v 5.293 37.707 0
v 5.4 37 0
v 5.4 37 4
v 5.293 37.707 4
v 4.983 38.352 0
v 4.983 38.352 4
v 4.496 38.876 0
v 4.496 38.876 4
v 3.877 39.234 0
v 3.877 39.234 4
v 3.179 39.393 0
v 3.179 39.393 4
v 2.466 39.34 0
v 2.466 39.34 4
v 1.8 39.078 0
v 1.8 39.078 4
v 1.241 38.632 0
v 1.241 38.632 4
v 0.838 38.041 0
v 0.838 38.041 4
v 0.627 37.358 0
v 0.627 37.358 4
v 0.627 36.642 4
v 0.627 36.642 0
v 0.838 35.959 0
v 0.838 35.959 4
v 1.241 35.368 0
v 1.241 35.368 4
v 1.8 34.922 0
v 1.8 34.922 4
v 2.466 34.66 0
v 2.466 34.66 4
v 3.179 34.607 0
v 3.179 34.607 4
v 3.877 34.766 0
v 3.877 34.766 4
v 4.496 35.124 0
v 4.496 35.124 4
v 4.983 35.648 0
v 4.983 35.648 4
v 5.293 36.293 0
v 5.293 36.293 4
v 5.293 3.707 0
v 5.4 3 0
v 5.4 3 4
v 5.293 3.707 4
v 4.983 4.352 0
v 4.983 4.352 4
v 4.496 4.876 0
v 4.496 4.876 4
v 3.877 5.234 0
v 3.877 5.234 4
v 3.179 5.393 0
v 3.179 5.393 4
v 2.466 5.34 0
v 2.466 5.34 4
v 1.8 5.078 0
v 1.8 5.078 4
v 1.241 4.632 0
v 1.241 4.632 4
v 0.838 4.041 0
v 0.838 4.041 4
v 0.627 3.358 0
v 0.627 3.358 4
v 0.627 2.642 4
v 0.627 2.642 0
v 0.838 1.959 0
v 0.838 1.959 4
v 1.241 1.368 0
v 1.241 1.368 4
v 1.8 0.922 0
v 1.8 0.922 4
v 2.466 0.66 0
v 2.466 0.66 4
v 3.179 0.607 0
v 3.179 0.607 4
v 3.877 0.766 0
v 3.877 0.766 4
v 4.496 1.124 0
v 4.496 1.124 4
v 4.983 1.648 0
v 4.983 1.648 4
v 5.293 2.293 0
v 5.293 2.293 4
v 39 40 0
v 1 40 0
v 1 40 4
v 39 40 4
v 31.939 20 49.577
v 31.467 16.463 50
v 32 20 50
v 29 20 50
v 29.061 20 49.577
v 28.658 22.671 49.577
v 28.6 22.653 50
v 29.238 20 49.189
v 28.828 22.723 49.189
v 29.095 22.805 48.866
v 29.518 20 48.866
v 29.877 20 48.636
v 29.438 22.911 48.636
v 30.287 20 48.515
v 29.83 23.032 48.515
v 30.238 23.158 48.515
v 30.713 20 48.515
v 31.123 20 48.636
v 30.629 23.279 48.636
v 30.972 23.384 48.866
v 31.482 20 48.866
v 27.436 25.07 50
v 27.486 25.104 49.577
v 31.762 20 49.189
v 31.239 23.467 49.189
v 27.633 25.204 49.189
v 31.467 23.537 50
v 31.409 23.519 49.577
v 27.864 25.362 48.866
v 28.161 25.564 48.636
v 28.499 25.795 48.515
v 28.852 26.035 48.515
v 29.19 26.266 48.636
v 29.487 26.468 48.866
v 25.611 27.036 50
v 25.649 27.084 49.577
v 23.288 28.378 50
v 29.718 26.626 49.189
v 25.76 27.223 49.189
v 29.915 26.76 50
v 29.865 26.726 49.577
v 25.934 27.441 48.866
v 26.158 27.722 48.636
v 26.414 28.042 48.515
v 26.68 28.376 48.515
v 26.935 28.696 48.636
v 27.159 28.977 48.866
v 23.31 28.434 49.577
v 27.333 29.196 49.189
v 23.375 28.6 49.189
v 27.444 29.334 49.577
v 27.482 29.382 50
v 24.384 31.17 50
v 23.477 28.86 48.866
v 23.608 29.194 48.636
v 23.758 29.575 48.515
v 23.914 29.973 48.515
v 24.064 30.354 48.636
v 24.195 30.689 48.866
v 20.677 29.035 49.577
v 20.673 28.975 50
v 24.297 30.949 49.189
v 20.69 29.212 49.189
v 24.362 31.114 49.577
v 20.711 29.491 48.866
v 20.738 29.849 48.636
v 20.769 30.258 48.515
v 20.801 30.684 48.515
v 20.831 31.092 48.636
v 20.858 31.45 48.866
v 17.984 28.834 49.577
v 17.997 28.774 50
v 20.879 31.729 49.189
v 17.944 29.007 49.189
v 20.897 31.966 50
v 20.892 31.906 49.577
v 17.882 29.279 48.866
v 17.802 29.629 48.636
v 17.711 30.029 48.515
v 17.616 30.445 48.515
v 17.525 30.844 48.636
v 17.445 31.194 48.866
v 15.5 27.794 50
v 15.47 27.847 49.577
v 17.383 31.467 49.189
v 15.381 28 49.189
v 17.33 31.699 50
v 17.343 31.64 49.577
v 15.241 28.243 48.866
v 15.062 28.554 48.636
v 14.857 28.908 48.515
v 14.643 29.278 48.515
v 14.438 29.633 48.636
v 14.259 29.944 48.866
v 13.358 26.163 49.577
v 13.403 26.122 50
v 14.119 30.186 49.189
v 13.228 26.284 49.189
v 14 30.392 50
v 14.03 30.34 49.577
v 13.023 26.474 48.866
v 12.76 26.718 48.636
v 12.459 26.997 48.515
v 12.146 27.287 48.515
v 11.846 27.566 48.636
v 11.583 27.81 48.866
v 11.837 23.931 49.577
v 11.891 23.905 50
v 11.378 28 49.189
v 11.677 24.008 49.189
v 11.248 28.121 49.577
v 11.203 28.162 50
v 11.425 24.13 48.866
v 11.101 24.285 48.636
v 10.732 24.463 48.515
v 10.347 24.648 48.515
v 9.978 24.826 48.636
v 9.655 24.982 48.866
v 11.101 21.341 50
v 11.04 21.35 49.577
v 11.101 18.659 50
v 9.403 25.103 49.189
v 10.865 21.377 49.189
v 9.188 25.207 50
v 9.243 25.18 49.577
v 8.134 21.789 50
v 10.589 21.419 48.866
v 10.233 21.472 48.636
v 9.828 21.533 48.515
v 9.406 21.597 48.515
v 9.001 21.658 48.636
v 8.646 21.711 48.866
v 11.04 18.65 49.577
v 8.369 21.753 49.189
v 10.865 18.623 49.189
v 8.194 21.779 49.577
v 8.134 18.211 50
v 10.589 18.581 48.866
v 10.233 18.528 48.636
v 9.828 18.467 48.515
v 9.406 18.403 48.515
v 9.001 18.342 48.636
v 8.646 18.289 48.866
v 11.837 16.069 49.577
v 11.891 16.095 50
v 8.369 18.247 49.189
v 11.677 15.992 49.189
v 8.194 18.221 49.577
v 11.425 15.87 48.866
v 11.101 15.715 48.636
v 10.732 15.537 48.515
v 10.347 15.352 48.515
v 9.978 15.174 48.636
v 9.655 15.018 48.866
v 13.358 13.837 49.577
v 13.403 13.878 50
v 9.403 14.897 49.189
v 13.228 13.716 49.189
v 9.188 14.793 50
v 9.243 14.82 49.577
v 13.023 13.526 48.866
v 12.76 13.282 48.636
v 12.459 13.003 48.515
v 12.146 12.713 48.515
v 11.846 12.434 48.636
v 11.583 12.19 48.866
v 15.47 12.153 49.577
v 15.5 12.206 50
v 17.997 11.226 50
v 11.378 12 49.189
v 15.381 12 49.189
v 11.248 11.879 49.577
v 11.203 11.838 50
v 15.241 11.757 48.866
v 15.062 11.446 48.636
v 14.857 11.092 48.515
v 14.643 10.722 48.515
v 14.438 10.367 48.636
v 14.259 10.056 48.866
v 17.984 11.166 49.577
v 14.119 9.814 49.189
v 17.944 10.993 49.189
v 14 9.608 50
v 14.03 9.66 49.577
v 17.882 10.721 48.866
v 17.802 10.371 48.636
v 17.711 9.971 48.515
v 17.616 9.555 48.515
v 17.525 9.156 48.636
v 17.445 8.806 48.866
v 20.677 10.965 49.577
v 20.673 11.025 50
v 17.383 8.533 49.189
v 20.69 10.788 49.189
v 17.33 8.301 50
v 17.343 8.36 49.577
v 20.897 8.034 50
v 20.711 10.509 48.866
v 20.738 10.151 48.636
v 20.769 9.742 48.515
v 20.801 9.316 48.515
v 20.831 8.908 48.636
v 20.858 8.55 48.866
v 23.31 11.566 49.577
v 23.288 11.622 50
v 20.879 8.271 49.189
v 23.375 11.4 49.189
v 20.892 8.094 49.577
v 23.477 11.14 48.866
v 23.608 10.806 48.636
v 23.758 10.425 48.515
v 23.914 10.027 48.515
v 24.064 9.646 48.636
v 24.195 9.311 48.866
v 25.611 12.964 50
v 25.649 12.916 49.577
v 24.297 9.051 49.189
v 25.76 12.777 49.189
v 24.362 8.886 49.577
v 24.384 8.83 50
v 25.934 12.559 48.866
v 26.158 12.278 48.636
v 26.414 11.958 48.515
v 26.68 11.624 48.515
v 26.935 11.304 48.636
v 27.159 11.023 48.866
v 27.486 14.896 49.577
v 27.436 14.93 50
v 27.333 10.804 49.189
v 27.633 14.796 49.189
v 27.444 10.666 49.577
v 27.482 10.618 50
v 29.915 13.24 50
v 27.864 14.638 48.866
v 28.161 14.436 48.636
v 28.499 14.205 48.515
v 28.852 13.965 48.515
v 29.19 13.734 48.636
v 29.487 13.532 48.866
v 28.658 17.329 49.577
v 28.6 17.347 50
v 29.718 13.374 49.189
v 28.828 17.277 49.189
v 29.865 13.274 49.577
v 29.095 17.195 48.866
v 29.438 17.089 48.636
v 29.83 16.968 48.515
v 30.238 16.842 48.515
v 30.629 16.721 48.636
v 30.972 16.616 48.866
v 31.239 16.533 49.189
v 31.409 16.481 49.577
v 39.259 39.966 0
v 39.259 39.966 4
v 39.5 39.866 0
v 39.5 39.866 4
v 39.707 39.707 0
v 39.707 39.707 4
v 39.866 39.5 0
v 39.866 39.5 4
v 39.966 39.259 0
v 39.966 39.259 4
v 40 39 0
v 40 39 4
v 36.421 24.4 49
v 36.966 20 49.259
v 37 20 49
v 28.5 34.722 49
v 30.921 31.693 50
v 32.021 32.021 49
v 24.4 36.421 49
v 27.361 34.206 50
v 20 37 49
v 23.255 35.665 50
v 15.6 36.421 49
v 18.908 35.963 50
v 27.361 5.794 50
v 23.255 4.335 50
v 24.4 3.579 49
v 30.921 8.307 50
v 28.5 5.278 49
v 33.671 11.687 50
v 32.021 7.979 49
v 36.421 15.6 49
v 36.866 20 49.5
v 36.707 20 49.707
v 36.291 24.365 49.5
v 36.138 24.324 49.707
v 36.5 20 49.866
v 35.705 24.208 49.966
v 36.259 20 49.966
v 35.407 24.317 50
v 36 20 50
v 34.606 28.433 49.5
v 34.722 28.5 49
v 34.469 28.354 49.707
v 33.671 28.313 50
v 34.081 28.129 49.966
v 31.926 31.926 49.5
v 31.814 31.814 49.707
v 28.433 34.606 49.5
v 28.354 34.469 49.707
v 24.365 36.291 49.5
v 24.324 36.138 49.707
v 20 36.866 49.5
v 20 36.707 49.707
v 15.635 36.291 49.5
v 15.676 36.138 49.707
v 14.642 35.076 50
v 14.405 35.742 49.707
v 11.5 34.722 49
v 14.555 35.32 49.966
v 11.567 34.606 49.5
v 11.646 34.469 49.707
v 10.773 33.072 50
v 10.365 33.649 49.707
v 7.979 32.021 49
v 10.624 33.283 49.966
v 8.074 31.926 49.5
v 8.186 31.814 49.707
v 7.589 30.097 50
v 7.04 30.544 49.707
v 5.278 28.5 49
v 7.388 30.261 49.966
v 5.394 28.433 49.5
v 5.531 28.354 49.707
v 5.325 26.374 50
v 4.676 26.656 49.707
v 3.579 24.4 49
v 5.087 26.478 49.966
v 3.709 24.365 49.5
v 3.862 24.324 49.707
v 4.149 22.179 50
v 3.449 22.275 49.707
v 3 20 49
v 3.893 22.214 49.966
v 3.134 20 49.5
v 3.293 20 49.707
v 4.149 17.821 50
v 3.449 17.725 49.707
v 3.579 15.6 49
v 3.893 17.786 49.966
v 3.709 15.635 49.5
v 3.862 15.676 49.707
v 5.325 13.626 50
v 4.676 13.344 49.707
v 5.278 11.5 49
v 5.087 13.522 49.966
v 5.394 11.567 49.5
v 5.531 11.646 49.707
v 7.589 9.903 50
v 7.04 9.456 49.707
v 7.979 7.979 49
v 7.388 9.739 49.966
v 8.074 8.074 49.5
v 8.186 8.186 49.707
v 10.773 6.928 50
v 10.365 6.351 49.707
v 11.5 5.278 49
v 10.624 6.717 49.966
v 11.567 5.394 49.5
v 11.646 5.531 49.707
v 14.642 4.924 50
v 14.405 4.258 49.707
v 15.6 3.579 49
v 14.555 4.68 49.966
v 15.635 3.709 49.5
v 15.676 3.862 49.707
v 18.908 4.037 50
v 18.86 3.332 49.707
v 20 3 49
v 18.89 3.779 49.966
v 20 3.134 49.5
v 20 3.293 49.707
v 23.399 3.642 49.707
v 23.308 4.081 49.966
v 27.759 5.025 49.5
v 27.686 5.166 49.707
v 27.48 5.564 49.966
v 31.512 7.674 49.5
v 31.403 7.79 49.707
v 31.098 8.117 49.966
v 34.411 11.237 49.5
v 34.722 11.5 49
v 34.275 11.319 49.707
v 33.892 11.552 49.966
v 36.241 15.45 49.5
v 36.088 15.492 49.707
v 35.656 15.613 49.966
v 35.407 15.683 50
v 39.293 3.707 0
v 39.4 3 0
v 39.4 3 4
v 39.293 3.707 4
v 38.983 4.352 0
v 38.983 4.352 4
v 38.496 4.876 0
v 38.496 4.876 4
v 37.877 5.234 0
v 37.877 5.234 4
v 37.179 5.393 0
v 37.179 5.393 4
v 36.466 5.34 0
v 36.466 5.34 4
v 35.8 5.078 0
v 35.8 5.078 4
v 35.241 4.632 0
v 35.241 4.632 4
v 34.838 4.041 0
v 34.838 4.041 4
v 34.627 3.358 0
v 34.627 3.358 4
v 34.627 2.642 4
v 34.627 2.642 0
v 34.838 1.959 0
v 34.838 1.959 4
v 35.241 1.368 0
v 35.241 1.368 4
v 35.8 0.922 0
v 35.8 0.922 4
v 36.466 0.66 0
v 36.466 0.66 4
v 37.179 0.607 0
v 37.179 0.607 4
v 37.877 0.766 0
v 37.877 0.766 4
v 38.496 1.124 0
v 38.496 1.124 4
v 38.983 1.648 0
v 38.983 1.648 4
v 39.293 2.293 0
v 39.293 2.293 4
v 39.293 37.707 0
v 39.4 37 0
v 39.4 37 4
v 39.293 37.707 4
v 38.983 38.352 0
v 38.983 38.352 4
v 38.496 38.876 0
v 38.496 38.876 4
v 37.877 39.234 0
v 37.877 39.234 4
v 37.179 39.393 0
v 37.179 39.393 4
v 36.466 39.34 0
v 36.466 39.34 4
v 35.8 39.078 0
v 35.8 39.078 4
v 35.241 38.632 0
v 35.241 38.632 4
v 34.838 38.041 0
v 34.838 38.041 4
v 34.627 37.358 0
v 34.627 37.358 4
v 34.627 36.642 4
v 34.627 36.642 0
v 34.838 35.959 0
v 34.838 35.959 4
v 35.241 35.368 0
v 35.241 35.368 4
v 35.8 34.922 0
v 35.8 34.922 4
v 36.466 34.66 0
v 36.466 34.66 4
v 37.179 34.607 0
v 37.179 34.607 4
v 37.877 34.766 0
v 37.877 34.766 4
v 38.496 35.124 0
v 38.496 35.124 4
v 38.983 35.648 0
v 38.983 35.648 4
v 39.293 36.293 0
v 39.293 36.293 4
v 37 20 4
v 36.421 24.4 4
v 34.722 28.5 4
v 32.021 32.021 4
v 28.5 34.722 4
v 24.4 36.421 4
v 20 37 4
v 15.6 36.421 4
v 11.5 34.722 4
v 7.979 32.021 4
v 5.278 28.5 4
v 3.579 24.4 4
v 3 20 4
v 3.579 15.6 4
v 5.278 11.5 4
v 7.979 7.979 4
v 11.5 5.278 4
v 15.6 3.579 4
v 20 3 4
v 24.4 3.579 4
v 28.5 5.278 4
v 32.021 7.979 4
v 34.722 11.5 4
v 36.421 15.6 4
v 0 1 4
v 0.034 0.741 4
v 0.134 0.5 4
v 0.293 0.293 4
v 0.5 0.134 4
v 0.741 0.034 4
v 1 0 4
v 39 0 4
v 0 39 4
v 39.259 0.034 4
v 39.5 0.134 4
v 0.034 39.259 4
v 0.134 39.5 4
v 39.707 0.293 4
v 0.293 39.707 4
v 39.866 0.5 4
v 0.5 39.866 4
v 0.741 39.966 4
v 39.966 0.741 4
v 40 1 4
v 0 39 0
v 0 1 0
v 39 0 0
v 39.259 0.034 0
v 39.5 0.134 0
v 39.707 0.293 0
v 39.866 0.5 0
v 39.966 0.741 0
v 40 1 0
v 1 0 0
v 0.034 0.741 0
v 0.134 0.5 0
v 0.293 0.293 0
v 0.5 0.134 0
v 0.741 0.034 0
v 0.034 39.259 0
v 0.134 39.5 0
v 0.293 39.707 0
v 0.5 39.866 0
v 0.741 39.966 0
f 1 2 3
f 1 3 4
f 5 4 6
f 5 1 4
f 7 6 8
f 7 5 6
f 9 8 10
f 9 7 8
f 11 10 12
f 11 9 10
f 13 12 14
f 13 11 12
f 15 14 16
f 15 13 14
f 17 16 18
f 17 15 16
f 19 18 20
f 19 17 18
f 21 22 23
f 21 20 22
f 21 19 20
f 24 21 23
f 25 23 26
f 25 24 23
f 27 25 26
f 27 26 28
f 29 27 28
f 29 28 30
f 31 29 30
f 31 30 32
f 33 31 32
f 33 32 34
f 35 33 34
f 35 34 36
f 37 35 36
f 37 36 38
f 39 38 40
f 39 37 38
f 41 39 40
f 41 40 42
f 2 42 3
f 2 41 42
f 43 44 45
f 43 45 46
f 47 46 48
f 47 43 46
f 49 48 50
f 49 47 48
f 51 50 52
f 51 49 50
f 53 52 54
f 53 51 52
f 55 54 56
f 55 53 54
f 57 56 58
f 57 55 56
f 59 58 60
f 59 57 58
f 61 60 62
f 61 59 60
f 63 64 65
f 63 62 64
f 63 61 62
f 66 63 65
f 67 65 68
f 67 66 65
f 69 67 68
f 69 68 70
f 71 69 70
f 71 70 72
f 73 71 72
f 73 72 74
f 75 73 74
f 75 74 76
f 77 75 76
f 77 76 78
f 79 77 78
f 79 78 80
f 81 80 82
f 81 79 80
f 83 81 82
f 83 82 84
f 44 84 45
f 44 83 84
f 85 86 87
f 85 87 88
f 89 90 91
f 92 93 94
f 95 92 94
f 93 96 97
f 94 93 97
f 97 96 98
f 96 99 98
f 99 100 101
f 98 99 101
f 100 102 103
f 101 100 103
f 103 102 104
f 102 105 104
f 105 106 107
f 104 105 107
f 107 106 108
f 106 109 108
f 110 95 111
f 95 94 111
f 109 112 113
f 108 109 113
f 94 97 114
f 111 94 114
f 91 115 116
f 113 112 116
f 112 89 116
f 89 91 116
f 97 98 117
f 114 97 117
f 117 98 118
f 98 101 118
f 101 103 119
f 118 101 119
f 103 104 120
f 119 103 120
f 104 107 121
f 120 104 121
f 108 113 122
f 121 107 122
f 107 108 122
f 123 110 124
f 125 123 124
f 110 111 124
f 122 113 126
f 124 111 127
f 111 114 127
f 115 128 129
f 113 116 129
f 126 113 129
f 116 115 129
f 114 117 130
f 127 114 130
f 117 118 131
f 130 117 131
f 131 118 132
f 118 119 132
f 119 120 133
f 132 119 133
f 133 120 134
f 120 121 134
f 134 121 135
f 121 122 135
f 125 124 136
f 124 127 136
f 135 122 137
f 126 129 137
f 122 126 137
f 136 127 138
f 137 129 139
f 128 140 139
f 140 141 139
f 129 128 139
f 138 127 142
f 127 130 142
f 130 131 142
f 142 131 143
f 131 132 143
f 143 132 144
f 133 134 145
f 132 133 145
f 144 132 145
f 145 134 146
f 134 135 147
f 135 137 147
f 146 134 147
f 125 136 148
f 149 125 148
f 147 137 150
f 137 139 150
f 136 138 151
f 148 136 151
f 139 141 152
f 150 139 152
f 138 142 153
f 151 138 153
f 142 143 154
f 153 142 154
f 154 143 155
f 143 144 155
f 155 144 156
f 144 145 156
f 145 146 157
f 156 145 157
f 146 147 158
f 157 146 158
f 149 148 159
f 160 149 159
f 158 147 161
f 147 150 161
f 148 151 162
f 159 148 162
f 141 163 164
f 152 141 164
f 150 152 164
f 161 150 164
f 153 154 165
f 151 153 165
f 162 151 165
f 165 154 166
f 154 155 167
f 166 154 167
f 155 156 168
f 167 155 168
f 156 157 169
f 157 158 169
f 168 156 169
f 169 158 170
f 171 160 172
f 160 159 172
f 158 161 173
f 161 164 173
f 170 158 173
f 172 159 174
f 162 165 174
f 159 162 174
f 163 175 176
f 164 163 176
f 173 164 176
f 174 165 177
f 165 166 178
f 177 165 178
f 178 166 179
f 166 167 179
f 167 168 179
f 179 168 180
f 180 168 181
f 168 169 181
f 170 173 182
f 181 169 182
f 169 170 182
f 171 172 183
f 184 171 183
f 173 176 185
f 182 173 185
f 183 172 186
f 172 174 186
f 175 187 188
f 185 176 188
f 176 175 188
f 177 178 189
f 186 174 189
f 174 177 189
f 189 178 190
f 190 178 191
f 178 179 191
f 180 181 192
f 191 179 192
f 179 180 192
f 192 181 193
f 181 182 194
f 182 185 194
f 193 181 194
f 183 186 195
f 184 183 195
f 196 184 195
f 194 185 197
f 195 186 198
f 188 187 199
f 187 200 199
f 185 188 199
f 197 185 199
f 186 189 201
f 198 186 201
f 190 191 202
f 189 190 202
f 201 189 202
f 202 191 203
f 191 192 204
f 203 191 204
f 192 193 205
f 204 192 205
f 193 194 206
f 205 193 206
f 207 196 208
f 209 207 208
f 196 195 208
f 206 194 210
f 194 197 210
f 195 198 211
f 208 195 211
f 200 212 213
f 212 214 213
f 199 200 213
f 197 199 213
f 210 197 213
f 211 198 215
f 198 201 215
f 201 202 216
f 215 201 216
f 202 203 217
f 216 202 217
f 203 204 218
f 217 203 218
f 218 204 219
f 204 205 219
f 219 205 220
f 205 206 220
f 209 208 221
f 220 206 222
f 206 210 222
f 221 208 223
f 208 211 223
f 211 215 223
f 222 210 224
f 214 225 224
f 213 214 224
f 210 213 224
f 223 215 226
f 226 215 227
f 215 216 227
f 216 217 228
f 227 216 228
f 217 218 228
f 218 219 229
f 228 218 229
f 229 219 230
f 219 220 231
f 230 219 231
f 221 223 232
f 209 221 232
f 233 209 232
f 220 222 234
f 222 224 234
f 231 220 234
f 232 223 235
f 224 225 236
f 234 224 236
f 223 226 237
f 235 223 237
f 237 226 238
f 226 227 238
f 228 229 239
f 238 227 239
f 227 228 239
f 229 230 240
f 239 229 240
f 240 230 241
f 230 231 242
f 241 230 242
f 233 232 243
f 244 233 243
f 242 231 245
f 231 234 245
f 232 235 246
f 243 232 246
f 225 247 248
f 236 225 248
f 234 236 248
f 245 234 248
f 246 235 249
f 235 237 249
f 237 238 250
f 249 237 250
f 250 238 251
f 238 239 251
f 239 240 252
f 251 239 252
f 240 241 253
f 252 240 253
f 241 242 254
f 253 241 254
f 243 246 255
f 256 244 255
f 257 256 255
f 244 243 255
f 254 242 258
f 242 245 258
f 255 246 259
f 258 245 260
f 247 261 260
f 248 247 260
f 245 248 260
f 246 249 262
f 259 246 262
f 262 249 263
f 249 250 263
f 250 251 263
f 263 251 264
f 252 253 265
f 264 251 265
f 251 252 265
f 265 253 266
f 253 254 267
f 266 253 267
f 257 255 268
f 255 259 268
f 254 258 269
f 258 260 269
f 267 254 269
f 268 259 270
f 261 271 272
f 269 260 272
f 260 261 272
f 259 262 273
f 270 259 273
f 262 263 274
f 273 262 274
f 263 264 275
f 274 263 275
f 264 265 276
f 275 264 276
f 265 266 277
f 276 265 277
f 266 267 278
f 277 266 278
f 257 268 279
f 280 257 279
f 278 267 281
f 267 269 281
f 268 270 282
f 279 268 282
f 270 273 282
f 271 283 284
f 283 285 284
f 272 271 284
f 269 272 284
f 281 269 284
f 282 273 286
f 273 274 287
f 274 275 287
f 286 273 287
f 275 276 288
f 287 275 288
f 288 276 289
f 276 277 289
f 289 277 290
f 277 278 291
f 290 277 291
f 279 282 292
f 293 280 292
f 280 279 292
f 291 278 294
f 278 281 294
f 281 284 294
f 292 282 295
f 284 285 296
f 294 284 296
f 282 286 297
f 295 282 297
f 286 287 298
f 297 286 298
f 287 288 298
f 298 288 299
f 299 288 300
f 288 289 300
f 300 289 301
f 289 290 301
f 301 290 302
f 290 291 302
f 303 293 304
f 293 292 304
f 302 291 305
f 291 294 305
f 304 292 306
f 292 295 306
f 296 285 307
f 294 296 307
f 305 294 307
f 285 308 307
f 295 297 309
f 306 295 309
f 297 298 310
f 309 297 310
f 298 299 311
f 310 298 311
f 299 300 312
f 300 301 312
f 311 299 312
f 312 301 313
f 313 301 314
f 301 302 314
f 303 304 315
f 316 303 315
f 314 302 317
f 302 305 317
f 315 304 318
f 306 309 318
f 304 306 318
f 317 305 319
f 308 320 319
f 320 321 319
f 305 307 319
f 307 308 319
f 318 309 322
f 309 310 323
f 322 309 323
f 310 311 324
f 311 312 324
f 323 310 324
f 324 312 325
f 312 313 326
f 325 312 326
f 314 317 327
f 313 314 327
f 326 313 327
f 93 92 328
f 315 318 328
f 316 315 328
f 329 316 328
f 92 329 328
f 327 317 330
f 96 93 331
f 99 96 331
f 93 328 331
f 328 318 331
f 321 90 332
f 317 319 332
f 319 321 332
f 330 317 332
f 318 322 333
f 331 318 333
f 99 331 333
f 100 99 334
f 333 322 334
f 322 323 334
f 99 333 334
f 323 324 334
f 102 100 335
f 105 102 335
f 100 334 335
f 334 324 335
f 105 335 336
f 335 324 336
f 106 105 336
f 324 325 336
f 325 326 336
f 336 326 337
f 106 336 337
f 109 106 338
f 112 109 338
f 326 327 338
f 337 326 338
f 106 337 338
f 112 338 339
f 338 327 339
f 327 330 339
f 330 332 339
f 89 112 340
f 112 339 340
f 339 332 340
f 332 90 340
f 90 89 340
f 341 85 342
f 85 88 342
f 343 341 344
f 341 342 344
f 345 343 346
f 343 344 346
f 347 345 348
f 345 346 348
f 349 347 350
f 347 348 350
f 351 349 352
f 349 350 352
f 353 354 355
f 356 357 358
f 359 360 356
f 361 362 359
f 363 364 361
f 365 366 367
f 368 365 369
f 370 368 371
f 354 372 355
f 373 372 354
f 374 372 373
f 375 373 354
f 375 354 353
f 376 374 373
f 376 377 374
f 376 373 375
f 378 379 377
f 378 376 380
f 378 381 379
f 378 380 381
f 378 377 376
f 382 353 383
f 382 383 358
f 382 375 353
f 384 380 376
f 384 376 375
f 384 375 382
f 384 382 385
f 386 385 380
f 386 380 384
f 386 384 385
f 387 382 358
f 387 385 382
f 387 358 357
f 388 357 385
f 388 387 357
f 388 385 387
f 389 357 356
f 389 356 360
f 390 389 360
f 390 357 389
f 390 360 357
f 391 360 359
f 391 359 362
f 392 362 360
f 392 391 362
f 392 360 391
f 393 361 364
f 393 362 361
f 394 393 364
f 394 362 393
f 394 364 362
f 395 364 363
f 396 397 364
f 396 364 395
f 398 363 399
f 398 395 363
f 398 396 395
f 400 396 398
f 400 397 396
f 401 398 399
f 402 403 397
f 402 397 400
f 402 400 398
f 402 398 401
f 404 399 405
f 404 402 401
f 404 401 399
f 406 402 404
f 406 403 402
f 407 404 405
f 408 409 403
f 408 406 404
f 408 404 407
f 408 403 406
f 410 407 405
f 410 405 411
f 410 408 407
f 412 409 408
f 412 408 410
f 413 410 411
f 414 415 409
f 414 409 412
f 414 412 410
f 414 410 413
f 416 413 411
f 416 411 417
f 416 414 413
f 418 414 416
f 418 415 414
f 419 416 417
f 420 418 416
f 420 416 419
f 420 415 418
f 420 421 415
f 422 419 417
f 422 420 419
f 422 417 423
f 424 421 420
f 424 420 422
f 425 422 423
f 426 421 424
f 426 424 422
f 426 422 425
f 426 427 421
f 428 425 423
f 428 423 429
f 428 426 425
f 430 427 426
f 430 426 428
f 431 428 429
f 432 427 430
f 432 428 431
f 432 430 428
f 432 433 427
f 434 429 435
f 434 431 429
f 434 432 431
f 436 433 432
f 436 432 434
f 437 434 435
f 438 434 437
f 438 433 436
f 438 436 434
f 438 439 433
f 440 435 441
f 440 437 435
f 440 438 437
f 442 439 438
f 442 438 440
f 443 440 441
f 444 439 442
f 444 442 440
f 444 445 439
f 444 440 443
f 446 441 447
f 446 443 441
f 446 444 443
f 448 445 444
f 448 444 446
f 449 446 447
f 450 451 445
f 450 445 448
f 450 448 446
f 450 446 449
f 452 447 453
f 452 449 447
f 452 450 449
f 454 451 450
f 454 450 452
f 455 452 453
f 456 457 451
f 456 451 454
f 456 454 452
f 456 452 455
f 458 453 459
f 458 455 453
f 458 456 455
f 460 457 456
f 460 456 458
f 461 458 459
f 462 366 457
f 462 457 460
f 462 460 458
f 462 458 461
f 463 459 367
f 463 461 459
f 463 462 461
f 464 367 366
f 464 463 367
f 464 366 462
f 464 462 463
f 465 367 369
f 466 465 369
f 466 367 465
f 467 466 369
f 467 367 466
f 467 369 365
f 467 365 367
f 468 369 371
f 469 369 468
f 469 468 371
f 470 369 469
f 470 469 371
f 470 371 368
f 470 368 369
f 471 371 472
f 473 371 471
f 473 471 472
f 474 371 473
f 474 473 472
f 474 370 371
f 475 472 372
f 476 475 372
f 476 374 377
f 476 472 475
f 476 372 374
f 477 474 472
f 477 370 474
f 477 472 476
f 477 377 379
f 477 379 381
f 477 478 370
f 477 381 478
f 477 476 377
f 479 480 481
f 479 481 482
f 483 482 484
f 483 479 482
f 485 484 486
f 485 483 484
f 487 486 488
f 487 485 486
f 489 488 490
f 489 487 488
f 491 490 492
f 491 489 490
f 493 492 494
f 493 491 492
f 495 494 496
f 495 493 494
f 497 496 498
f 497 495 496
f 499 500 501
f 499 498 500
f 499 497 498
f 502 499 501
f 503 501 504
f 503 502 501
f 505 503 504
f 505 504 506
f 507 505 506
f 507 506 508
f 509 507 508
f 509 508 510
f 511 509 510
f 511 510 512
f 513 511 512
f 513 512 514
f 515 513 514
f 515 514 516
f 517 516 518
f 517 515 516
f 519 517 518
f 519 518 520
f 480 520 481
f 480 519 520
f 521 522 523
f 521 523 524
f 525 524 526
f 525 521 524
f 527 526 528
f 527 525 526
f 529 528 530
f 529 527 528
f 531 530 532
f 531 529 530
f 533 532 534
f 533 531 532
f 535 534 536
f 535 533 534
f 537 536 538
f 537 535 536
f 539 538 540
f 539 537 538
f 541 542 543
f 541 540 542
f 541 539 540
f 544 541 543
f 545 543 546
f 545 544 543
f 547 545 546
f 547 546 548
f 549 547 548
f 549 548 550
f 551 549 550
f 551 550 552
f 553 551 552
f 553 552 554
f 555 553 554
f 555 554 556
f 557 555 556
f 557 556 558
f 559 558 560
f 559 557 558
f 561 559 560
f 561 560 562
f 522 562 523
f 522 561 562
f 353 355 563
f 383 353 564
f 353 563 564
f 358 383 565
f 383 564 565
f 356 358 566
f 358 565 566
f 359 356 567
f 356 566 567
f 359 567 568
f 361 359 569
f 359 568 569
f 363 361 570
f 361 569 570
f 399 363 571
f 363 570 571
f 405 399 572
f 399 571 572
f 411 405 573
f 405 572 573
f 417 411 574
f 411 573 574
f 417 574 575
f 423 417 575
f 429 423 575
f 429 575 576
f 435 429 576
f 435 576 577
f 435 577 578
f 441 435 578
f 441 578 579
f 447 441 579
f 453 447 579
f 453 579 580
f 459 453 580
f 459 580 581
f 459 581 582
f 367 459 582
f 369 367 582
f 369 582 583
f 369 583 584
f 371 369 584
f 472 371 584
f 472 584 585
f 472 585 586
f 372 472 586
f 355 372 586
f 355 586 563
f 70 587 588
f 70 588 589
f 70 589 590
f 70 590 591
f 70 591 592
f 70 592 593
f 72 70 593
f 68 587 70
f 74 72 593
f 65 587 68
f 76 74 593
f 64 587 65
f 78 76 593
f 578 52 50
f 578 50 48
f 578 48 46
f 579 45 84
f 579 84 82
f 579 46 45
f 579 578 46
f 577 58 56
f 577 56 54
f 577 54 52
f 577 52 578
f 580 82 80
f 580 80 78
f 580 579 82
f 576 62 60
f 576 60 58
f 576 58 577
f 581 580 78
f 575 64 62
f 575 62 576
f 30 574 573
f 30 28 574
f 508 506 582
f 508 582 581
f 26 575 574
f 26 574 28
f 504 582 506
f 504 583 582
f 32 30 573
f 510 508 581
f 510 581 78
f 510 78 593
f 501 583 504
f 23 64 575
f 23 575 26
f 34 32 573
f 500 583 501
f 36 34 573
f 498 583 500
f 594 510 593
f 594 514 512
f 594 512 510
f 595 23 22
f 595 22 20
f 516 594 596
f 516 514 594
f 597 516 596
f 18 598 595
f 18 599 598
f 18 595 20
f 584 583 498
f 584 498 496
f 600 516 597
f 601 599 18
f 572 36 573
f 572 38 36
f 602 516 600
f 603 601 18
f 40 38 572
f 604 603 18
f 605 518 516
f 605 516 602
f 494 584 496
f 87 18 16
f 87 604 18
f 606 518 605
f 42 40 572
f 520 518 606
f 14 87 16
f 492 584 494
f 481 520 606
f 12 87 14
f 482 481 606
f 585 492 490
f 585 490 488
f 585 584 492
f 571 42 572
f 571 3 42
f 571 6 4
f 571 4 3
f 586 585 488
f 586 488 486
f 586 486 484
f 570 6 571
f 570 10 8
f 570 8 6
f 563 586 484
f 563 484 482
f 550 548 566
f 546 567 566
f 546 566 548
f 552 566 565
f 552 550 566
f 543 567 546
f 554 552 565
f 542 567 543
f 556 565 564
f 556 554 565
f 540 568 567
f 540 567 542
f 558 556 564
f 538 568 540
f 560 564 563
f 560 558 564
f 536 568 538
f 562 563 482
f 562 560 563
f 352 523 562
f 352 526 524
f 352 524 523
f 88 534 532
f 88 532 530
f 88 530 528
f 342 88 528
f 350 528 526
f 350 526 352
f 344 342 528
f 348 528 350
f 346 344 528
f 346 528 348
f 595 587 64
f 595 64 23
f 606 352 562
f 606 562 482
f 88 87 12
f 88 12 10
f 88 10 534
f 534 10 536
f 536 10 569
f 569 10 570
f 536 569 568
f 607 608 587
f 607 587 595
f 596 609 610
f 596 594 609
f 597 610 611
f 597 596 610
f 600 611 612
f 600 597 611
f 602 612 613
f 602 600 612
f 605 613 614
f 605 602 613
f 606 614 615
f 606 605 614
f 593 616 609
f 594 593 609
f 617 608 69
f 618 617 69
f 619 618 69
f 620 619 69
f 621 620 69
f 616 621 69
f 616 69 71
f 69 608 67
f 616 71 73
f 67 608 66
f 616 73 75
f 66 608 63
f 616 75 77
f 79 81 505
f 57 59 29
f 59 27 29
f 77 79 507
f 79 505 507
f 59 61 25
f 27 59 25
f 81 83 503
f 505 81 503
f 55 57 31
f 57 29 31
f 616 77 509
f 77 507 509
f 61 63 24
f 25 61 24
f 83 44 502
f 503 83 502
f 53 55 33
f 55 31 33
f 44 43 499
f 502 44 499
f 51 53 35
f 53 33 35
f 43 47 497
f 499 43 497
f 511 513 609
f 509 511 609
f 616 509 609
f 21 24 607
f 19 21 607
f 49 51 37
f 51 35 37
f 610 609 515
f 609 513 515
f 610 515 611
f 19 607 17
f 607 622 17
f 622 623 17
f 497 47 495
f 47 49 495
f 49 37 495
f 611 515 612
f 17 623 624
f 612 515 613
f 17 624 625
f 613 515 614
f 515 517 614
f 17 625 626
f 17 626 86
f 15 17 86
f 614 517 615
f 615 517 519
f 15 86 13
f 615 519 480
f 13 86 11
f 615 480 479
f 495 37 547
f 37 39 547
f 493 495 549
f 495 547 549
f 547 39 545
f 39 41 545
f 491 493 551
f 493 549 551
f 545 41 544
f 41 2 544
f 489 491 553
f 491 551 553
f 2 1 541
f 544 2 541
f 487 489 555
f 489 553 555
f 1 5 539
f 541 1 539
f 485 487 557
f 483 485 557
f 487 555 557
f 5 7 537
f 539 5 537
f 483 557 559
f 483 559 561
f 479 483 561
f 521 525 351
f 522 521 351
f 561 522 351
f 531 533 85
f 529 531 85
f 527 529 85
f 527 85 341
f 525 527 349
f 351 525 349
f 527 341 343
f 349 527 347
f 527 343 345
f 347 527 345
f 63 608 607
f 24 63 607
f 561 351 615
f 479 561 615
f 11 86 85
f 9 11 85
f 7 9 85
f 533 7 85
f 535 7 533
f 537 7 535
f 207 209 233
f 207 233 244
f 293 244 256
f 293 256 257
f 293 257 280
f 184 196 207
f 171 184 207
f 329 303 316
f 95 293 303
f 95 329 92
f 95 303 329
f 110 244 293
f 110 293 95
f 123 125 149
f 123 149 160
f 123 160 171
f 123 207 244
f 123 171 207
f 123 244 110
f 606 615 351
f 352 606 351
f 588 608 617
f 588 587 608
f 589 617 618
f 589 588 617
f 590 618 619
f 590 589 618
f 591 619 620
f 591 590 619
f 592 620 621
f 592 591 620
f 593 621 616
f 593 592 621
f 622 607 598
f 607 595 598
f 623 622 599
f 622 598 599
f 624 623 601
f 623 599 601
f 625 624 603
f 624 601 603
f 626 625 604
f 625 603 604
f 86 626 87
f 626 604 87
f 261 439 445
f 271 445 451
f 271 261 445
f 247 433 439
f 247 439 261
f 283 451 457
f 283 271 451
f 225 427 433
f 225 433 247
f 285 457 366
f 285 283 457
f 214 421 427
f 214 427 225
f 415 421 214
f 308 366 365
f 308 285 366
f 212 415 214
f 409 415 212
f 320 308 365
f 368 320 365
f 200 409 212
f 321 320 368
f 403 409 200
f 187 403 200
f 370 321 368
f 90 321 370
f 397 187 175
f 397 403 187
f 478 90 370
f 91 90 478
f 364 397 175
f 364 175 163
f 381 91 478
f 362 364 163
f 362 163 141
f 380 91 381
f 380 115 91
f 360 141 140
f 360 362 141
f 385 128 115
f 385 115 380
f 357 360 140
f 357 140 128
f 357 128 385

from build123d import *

# Parameters (mm, degrees)
CYLINDER001_R     = 2.4
CYLINDER001_DEPTH = 10
ARRAY_X_COUNT     = 2
ARRAY_X_PITCH     = 34
ARRAY_Y_COUNT     = 2
ARRAY_Y_PITCH     = 34
TORUS_R           = 1.5
BOX_W             = 40
BOX_H             = 40
BOX_DEPTH         = 4
CYLINDER_R        = 17
CYLINDER_DEPTH    = 50
FILLET_R          = 1


with BuildPart() as taladros:
    # Cylinder001 → Cylinder001 (new body)
    with BuildSketch(Plane(origin=(3, 3, -1), x_dir=(1, 0, 0), z_dir=(0, 0, 1))):
        Circle(CYLINDER001_R)
    extrude(amount=CYLINDER001_DEPTH)

    # Array X: Taladros ×2


with BuildPart() as taladros_1:
    add(taladros.part)
    with Locations(*[(i * ARRAY_X_PITCH, 0, 0) for i in range(1, ARRAY_X_COUNT)]):
        add(taladros.part)

    # Array Y: Taladros ×2


with BuildPart() as taladros_2:
    add(taladros_1.part)
    with Locations(*[(0, i * ARRAY_Y_PITCH, 0) for i in range(1, ARRAY_Y_COUNT)]):
        add(taladros_1.part)


with BuildPart() as alojamiento_torica:
    # Torus → Torus (revolve)
    with BuildSketch(Plane(origin=(20, 20, 50), x_dir=(1, 0, 0), z_dir=(0, -1, 0))):
        with Locations((10.5, 0)):
            Circle(TORUS_R)
    revolve(axis=Axis((20, 20, 50), (0, 0, 1)))


with BuildPart() as base:
    # Box → Box (new body)
    with BuildSketch(Plane.XY):
        with Locations((20, 20)):
            Rectangle(BOX_W, BOX_H)
    extrude(amount=BOX_DEPTH)


with BuildPart() as pata_ikea_redondeada:
    # Cylinder → Cylinder (new body)
    with BuildSketch(Plane(origin=(20, 20, 0), x_dir=(1, 0, 0), z_dir=(0, 0, 1))):
        Circle(CYLINDER_R)
    extrude(amount=CYLINDER_DEPTH)

    # Fusion: union Base
    add(base.part)

    # Cut: cut Alojamiento_torica
    add(alojamiento_torica.part, mode=Mode.SUBTRACT)

    # Cut001: cut Taladros
    add(taladros_2.part, mode=Mode.SUBTRACT)

    # Fillet
    fillet_edges = [pata_ikea_redondeada.edges().sort_by_distance(p)[0] for p in [
        (3, 20, 50),
        (0, 0, 2),
        (0, 40, 2),
        (40, 40, 2),
        (40, 0, 2),
    ]]
    fillet(fillet_edges, radius=FILLET_R)


solid = pata_ikea_redondeada.part
